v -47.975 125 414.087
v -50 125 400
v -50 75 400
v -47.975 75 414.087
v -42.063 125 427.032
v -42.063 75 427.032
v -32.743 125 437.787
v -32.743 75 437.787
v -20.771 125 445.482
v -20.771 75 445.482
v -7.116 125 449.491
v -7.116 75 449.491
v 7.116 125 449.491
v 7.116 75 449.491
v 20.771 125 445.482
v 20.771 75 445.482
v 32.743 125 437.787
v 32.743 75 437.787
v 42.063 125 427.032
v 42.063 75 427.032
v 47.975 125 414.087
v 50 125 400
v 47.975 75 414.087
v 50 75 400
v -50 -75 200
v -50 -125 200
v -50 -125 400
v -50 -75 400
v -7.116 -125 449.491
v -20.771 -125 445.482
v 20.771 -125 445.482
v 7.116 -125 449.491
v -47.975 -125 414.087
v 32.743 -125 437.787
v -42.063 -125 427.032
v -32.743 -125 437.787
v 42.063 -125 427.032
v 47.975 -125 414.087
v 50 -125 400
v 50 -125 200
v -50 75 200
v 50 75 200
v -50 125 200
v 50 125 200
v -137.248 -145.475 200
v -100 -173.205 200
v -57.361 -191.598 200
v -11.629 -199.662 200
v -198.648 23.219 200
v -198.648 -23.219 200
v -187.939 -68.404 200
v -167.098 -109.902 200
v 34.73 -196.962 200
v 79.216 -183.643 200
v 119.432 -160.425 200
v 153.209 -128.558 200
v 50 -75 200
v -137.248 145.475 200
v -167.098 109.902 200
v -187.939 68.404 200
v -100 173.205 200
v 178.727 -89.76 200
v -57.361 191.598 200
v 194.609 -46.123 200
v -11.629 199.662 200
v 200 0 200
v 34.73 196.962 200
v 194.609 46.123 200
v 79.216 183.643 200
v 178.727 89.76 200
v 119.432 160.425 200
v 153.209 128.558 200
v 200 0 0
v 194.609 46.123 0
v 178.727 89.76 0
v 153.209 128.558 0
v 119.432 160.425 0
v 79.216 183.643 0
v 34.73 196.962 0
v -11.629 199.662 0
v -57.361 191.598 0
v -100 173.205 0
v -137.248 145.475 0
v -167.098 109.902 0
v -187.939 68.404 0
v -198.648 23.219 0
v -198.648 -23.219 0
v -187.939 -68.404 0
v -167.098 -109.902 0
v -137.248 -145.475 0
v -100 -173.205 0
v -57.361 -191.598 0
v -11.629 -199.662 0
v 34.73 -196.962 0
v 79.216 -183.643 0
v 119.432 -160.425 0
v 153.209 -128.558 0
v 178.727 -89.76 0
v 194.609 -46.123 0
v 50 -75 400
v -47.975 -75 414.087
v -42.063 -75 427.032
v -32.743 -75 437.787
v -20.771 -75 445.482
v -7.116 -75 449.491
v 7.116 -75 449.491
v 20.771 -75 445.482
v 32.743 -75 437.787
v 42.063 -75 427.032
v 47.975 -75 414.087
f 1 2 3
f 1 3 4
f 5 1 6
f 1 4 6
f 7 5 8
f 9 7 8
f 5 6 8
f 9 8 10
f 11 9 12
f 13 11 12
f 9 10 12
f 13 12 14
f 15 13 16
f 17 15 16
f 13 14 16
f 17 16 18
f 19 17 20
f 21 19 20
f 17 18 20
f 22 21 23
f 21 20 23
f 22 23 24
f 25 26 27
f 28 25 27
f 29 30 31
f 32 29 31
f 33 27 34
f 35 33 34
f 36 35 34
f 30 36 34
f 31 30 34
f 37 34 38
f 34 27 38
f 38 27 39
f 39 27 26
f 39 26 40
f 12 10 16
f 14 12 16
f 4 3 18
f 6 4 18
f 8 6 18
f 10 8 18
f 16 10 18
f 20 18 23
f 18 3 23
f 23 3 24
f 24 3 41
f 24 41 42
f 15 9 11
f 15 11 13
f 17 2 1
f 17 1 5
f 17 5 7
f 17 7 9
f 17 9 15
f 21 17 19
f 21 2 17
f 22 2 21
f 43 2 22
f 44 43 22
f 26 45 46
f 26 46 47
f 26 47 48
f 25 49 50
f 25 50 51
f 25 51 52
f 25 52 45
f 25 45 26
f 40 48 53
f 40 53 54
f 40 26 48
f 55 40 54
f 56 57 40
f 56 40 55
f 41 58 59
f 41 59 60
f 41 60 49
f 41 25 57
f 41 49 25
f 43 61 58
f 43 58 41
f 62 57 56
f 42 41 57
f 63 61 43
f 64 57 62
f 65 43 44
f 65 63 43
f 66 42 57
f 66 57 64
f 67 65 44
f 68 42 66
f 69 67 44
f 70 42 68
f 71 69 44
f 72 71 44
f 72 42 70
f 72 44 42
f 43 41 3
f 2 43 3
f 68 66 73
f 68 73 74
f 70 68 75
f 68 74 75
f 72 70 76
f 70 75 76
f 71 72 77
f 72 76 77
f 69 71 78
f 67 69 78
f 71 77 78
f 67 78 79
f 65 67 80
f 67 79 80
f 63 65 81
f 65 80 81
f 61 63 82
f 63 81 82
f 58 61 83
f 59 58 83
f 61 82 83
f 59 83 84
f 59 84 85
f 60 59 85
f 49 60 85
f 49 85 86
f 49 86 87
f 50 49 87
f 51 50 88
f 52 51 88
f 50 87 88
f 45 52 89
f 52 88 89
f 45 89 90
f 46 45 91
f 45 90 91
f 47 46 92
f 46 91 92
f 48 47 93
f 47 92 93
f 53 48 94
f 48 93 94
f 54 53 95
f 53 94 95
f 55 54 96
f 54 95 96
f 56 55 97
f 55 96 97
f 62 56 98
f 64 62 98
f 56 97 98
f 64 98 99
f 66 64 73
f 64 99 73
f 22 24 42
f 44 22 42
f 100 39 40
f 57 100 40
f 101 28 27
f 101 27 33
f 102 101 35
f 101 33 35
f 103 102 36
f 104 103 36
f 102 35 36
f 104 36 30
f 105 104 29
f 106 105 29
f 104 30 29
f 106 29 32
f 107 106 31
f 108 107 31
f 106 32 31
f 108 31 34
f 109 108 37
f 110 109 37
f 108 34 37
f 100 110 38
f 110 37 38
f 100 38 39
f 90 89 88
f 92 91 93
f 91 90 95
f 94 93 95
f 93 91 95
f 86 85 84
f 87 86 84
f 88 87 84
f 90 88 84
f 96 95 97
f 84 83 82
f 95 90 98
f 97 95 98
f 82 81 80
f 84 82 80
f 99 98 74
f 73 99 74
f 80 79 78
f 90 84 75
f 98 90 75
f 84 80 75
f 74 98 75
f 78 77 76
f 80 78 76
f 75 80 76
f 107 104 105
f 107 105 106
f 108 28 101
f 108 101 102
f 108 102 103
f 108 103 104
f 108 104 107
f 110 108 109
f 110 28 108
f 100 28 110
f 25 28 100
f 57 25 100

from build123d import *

# Parameters (mm, degrees)
SKETCH1_R           = 200
BOSS_EXTRUDE1_DEPTH = 200
BOSS_EXTRUDE2_START = 75
BOSS_EXTRUDE2_DEPTH = 50
BOSS_EXTRUDE3_START = -125
BOSS_EXTRUDE3_DEPTH = 50


with BuildPart() as part:
    # Sketch1 → Boss-Extrude1 (new body)
    with BuildSketch(Plane.XY):
        Circle(SKETCH1_R)
    extrude(amount=BOSS_EXTRUDE1_DEPTH)

    # Sketch2 → Boss-Extrude2 (add)
    with BuildSketch(Plane(origin=(0, 0, 0), x_dir=(1, 0, 0), z_dir=(0, 1, 0)).offset(BOSS_EXTRUDE2_START)):
        with BuildLine():
            Line((-50, -200), (-50, -400))
            ThreePointArc((-50, -400), (0, -450), (50, -400))
            Line((50, -400), (50, -200))
            Line((50, -200), (-50, -200))
        make_face()
    extrude(amount=BOSS_EXTRUDE2_DEPTH)

    # Sketch2<2> → Boss-Extrude3 (add)
    with BuildSketch(Plane(origin=(0, 0, 0), x_dir=(1, 0, 0), z_dir=(0, 1, 0)).offset(BOSS_EXTRUDE3_START)):
        with BuildLine():
            Line((-50, -200), (-50, -400))
            ThreePointArc((-50, -400), (0, -450), (50, -400))
            Line((50, -400), (50, -200))
            Line((50, -200), (-50, -200))
        make_face()
    extrude(amount=BOSS_EXTRUDE3_DEPTH)


solid = part.part
